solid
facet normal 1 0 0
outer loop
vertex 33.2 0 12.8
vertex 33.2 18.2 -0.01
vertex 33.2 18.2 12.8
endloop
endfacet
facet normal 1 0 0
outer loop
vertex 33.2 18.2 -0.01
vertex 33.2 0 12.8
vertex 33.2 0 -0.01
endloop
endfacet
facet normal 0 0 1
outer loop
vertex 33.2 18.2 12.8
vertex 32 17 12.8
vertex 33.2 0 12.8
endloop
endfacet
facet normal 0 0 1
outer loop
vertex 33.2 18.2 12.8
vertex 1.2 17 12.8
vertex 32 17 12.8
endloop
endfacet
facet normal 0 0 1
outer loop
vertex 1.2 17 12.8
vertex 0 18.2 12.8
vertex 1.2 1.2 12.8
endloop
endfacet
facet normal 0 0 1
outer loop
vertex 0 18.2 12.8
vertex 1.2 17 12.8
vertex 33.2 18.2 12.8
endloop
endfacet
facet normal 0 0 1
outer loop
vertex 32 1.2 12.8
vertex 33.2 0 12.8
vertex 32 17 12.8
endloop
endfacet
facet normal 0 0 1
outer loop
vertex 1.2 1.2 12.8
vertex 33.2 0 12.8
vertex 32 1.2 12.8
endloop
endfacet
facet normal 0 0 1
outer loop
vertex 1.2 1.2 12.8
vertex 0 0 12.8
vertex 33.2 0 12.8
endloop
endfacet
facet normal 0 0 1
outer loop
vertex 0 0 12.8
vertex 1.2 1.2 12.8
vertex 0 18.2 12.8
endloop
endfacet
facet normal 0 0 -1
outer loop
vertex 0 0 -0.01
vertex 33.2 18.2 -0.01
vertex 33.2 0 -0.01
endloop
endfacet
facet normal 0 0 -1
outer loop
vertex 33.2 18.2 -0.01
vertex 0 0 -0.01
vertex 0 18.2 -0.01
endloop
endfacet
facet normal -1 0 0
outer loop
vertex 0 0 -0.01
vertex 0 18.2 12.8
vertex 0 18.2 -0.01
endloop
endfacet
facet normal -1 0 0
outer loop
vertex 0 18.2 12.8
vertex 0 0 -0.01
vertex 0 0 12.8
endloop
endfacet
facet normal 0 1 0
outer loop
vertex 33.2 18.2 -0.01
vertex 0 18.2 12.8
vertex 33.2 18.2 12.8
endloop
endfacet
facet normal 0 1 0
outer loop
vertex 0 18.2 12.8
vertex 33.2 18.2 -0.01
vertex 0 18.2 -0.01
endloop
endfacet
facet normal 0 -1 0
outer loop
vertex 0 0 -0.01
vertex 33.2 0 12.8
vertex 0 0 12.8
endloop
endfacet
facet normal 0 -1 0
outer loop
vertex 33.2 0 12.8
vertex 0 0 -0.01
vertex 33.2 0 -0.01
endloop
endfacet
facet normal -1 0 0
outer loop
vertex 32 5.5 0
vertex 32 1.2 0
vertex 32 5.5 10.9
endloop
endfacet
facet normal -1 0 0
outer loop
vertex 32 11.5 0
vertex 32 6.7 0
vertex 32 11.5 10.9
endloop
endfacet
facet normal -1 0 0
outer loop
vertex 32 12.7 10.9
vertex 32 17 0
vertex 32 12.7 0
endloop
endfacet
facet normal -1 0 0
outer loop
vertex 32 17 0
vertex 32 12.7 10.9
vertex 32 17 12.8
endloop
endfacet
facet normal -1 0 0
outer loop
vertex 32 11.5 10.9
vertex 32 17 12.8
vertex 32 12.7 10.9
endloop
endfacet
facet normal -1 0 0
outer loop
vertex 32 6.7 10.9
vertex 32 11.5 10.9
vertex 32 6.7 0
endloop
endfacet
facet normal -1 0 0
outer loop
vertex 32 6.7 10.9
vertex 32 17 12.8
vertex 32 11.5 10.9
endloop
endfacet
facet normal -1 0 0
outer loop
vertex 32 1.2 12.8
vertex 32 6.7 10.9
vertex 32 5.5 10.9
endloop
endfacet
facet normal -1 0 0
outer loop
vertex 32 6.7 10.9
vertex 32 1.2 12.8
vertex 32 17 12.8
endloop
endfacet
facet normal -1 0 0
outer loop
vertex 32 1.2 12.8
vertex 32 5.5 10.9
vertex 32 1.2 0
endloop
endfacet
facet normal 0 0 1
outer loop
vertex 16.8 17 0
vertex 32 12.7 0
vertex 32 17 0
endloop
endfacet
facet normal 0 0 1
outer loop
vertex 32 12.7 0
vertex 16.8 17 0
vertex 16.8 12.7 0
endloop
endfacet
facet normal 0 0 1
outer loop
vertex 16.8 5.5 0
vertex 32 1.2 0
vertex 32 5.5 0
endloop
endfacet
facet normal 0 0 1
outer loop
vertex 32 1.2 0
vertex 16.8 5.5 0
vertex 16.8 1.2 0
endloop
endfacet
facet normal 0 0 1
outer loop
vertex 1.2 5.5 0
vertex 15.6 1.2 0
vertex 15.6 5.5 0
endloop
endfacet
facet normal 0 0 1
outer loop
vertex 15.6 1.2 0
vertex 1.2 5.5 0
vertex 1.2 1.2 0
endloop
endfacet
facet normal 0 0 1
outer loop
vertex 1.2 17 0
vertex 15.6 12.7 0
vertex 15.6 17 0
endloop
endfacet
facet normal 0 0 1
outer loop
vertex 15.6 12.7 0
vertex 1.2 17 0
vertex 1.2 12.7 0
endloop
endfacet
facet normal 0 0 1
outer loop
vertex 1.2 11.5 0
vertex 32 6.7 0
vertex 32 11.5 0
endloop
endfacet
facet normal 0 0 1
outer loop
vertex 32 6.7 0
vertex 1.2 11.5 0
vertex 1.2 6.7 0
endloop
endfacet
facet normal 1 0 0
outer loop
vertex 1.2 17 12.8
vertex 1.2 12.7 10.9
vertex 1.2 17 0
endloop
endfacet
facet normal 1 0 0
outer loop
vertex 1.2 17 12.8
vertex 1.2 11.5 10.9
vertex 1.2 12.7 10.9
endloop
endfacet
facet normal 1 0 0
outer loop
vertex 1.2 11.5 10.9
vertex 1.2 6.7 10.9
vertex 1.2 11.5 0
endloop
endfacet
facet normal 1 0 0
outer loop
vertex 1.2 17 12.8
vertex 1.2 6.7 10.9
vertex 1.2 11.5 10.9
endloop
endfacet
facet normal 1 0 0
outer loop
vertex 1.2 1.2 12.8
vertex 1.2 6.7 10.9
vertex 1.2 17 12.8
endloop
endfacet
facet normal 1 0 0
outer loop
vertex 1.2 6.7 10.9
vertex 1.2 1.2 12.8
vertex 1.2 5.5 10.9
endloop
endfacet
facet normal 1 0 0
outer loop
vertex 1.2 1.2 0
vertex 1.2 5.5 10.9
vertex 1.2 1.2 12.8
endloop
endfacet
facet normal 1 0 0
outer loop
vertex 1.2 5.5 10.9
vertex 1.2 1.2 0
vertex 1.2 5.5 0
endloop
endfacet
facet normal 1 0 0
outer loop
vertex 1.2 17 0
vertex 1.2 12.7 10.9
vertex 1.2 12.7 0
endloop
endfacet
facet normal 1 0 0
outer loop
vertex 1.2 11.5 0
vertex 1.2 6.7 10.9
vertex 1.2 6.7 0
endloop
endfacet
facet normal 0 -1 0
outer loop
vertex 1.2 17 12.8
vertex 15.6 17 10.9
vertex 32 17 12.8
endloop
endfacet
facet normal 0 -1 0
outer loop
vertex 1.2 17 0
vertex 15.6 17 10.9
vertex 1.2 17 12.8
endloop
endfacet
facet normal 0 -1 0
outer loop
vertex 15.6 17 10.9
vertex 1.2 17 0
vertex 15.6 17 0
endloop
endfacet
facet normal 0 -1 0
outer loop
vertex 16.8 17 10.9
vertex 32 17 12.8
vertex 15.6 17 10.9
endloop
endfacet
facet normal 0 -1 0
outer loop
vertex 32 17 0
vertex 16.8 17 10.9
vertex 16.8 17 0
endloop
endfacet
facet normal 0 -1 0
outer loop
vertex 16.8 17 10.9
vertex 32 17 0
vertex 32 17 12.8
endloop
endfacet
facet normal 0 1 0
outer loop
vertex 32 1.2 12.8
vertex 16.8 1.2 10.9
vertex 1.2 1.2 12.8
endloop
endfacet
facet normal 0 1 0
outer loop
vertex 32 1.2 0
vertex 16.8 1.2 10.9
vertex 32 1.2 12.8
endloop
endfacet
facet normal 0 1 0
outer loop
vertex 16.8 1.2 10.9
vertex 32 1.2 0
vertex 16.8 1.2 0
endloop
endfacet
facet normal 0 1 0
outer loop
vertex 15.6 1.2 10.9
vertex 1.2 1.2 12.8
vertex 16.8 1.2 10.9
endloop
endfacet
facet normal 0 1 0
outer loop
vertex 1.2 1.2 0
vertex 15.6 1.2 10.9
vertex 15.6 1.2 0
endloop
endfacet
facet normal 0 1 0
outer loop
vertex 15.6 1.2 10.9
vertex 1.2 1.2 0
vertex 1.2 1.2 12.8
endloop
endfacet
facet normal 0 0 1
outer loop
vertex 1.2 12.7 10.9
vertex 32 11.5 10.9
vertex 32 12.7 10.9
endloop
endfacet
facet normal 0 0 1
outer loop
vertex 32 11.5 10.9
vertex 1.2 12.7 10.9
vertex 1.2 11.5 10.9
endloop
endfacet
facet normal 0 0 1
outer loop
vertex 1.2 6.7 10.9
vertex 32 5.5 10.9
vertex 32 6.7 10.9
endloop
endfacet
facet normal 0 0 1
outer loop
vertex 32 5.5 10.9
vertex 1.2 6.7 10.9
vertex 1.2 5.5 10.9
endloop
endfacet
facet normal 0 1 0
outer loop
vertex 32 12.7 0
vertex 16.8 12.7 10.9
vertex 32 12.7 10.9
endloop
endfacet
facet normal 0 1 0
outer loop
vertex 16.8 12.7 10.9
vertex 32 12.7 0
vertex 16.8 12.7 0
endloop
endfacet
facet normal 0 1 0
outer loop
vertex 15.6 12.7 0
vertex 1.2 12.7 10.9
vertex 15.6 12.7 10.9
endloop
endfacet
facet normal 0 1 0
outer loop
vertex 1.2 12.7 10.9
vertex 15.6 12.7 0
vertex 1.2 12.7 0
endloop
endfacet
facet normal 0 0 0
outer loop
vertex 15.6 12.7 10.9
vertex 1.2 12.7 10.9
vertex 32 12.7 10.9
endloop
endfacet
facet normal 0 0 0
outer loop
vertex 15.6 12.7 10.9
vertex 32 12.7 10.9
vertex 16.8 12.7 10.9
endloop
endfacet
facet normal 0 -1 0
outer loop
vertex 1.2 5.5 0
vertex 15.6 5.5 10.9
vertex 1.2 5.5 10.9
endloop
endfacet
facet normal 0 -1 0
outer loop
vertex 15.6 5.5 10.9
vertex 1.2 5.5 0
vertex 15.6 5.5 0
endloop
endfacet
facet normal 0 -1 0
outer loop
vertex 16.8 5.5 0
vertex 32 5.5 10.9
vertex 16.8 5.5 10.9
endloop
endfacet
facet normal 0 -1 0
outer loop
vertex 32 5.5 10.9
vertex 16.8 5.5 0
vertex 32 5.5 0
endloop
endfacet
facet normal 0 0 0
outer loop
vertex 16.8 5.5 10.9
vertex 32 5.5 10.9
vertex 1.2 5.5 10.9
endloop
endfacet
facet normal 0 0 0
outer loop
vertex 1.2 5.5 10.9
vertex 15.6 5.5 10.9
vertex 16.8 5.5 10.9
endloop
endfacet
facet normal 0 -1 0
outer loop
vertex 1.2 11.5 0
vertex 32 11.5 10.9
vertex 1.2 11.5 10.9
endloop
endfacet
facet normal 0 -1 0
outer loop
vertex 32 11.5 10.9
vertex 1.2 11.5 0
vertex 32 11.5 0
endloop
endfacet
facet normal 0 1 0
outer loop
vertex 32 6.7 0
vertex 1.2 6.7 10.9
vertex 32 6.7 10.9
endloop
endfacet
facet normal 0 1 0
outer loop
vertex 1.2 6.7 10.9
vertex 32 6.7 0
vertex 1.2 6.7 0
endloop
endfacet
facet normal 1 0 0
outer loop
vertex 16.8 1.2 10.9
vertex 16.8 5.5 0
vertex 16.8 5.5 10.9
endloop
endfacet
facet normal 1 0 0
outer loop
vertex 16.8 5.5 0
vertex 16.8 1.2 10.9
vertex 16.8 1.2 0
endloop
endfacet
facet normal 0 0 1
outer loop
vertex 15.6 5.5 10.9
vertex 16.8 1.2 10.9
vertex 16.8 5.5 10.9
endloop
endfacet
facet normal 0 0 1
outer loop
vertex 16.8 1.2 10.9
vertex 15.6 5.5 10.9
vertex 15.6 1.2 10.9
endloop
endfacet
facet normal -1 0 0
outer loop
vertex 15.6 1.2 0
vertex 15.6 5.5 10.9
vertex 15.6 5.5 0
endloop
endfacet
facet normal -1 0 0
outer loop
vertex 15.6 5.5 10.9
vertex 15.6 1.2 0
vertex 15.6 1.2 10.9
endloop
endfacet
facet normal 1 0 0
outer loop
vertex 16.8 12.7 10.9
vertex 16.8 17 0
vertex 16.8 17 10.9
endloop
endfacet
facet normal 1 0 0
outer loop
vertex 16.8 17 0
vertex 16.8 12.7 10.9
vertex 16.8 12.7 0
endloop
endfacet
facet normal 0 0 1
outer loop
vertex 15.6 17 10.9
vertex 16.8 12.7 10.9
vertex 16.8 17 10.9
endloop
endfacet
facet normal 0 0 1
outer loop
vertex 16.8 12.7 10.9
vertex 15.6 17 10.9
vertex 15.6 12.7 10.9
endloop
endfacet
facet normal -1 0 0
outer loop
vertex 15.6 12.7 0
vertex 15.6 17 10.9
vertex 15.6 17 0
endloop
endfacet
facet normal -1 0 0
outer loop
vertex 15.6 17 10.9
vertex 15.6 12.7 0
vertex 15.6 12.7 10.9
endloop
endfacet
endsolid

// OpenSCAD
// file: ../Base/Boxes.scad
// Fischertechnik Box Foundation
// Pre-designed Boxes

use <Constants.scad>

include <PlacementOptions.scad>

box190Width = 190;
box190Depth = 130;
box130Width = 130;
box130Depth = 95;
boxUsageHeight = 33.9;
boxWallThickness = 2.4;
boxBaseThickness = 1.0;

// getBoxWallThickness()
// Gets the wall thickness of a Fischertechnik Box

function getBoxWallThickness() = boxWallThickness;

// Gets the usable height of a fischertechnik box
function getBoxUsageHeight() = boxUsageHeight;

// Gets the thickness of the Fischertechnik box base.
function getBoxBaseThickness() = boxBaseThickness;

// Gets the usable inner space of a Box 190 as an x/y-list
function getBox190Space() = [
    box190Width - 2*getBoxWallThickness(), 
    box190Depth - 2*getBoxWallThickness() ];

// Imports the Fischertechnik empty box 130x190 mm and places it at position 0,0
// 190x130 are the outer sizes, the inner space is slightly smaller. Use getBox190Space() to get the inner sizes.
// This module needs the STL file "Fischertechnik Box 130x190.stl" in the library path.
// The box is positioned that the usable inner space is at the 0,0,0 position. The

module Box190() {
    translate([-getBoxWallThickness(),-getBoxWallThickness(),-getBoxBaseThickness()])
        import("Fischertechnik Box 130x190.stl", convexity=3);
}

// Gets the usable inner space of a Box 130 as an x/y-list
function getBox130Space() = [
    box130Width - 2*getBoxWallThickness(), 
    box130Depth - 2*getBoxWallThickness() ];

// Imports the Fischertechnik empty box 95x130 mm and places it at position 0,0
// 190x130 are the outer sizes, the inner space is slightly smaller. Use getBox190Space() to get the inner sizes.
// This module needs the STL file "Fischertechnik Box 95x130.stl" in the library path.
// The box is positioned that the usable inner space is at the 0,0,0 position. The

module Box130() {
    translate([-getBoxWallThickness(),-getBoxWallThickness(),-getBoxBaseThickness()])
        import("Fischertechnik Box 95x130.stl", convexity=3);
}

// Creates a web at the specified box walls
// corner 0 = LowerLeft, 1 = UpperLeft, 2 = UpperRight, 3 = LowerRight
// side 0 = LeftOfCorner, 1 = RightOfCorner
// distance = Distance in mm from the corner
// box = inner width and depth of the box (default: Box 190)
// webWidth = length of the web (default is 3 mms)
// webThickness = thickness of the web (default is 1 mm)

module BoxWeb(corner, side, distance, box=getBox190Space(), webWidth=3, webThickness=1.0) {
    sink = getBoxWallThickness()/2;

    width = (corner % 2 == 0) ? 
            (side == LeftOfCorner ? webWidth : webThickness) :
            (side == LeftOfCorner ? webThickness : webWidth);

    depth = (corner % 2 == 0) ? 
            (side == RightOfCorner ? webWidth : webThickness) :
            (side == RightOfCorner ? webThickness : webWidth);
    
    xDiff = corner == LowerLeft ? 
                (side == LeftOfCorner ? -sink : distance) :
            (corner == UpperLeft ?                
                (side == LeftOfCorner ? distance : -sink) :
            (corner == UpperRight ?
                (side == LeftOfCorner ? box.x-webWidth+sink : box.x-distance-webThickness) :
                (side == LeftOfCorner ? box.x-distance-webThickness: box.x-webWidth+sink)));

    yDiff = corner == LowerLeft ? 
                (side == RightOfCorner ? -sink : distance) :
            (corner == UpperLeft ?
                (side == RightOfCorner ? box.y-distance : box.y-webWidth+sink) :
            (corner == UpperRight ?
                (side == RightOfCorner ? box.y-webWidth+sink : box.y-distance) :
                (side == RightOfCorner ? distance : -sink)));
    
    translate([xDiff, yDiff, -getExcess()])
        cube([width, depth, boxUsageHeight + 2*getExcess()]);
}
// file: ../Base/Rotation.scad
// Fischertechnik Box Foundation
// Geometry Helpers Rotation

include <PlacementOptions.scad>

// getRotatedSpace(space, rotation=NoRotation)
// Rotates the space dependent on the specified rotation

function getRotatedSpace(space, rotation=NoRotation) = [
    (rotation == Rotate90 || rotation == Rotate270) ? space.y : space.x,
    (rotation == Rotate90 || rotation == Rotate270) ? space.x : space.y
];

// Rotates the given space around the fixed left lower corner
// space = the space the children needs as width/depth list [width,depth]
// rotation = 0 Rotate0 degrees, 1 Rotate90 degrees, 2 Rotate180 degrees, 3 Rotate270 degrees (equivalent to -90)

module RotateFix(space, rotation=Rotate0) {
    dy = (rotation == Rotate0 || rotation == Rotate270) ? 0 :
        (rotation == Rotate90) ? space.x :
        space.y;
    dx = (rotation < Rotate180) ? 0 :
        (rotation == Rotate180) ? space.x :
        space.y;
    
    translate([dx, dy, 0])
        rotate([0, 0, rotations[rotation]])
            children();
}
// file: ../Base/Alignment.scad
// Fischertechnik Box Foundation
// Geometry Helpers Alignment

include <PlacementOptions.scad>

// getAlignedX(elementWidth, spaceWidth, align=AlignRight, offset=0)
// Gets the aligned X offset of an element with the given
// width in the given space.
// elementWidth = The width of the element to positon
// spaceWidth = The space where the element should be aligned
// align = 0 AlignLeft, 1 AlignCenter, 2 AlignRight
// offset = an optional offset from the aligned position. When
// aligned left or centered, then positive values are in X direction.
// When aligned right then positive values are in negative X direction.

function getAlignedX(elementWidth, spaceWidth, align=AlignRight, offset=0) =
    (align == AlignLeft) ?
        offset :
        ((align == AlignCenter) ?
        (spaceWidth - elementWidth)/2 + offset :
        spaceWidth - offset - elementWidth);

// getAlignedY(elementDepth, spaceDepth, align=AlignTop, offset=0)
// Gets the aligned Y offset of an element with the given
// depth in the given space.
// elementDepth = The depth of the element to positon
// spaceDepth = The space where the element should be aligned
// align = 0 AlignBottom, 1 AlignCenter, 2 AlignTop
// offset = an optional offset from the aligned position. When
// aligned bottom or centered, then positive values are in Y direction.
// When aligned top then positive values are in negative Y direction.

function getAlignedY(elementDepth, spaceDepth, align=AlignTop, offset=0) =
    (align == AlignBottom) ?
        offset :
        ((align == AlignCenter) ?
        (spaceDepth - elementDepth)/2 + offset :
        spaceDepth - offset - elementDepth);
// file: ../Base/PlacementOptions.scad
// Fischertechnik Box Foundation
// Placement Options

// Alignment
NoAlign = 0;
AlignLeft = 1;
AlignBottom = 2;
AlignCenter = 3;
AlignRight = 4;
AlignTop = 5;

// Element rotation degree steps
rotations = [0, -90, -180, -270];

// Rotation
NoRotation = 0;
Rotate0 = 0;
Rotate90 = 1;
Rotate180 = 2;
Rotate270 = 3;

// Docking (seen from above)
NoDock = -1;
DockLeft = 0;
DockTop = 1;
DockRight = 2;
DockCorner = 2;
DockBottom = 3;

// Web corners
LowerLeft = 0;
UpperLeft = 1;
UpperRight = 2;
LowerRight = 3;

// Web position relative to corner
LeftOfCorner = 0;
RightOfCorner = 1;
// file: ../Base/Placement.scad
// Fischertechnik Box Foundation
// Geometry Helpers Placement

use <Constants.scad>
use <Alignment.scad>
use <Rotation.scad>
use <Boxes.scad>

include <PlacementOptions.scad>

// Place(x=0, y=0, elementSpace=[0,0], alignX=AlignLeft, alignY=AlignBottom, rotation=Rotate0, boxSpace=getBox190Space())
// Places the child at the specified position
// y = Y-Position. This is a relative position when an X aligment is specified.
// x = X-Position. This is a relative position when an Y aligment is specified.
// elementSpace = space of the element to be placed [x,y]
// alignX = -1=NoAlign, 0 AlignLeft, 1 AlignCenter, 3 AlignRight (elementSpace and boxSpace required!)
// alignY = -1=NoAlign, 2 AlignBottom, 1 AlignCenter, 4 AlignTop (elementSpace and boxSpace required!)
// rotation = 0 Rotate0 0 degrees, 1 Rotate90 90 degrees, 
// 2 Rotate180 180 degrees, 3 Rotate270 270 degrees (equivalent to -90)
// boxSpace = Inner space of the box where the placement occurs [x,y] - default is Box 190x130 inner space

module Place(x=0, y=0, elementSpace=[0,0], 
  alignX=AlignLeft, alignY=AlignBottom, 
  rotation=NoRotation, boxSpace=getBox190Space()) {

    module Position(x, y, space, rotation=Rotate0) {
        translate([x, y, 0])
            RotateFix(space, rotation)
                children(0);
    }

    space = getRotatedSpace(elementSpace, rotation);
    alignedX = getAlignedX(space.x, boxSpace.x, alignX, x);
    alignedY = getAlignedY(space.y, boxSpace.y, alignY, y);
    Position(alignedX, alignedY, elementSpace, rotation)
        children(0);
}

// Center(space=getBox130Space(), elementSpace=[0,0])
// space = Space where the children is centered. For cylinder use centered=true and no elementSpace.
// elementSpace = space of the element to be centered [x,y]

module Center(space=getBox190Space(), elementSpace=[0,0]) {
    translate([(space.x - elementSpace.x) / 2, (space.y - elementSpace.y) / 2])
        children(0);
}

// CenterHorizontal(width=0, y=0, offset=0, space=getBox130Space())
// space = Space where the children is centered. For cylinder use centered=true and no elementSpace.
// elementSpace = space of the element to be centered [x,y]

module CenterHorizontal(width=0, y=0, offset=0, space=getBox190Space()) {
    translate([(space.x - width) / 2 + offset, y])
        children(0);
}

// CenterVertical(depth=0, x=0, offset=0, space=getBox130Space())
// space = Space where the children is centered. For cylinder use centered=true and no elementSpace.
// elementSpace = space of the element to be centered [x,y]

module CenterVerticalal(depth=0, x=0, offset=0, space=getBox190Space()) {
    translate([x, (space.y - depth) / 2 + offset])
        children(0);
}
// file: ../Base/Constants.scad
// Fischertechnik Box Foundation
// Constants

// Constant values necessary for multiple elements

// Base constants
dividerThickness = 1.2;
excess = 0.01;
fragments = 90;
tolerance = 0.8;

// Gets the thickness of a divider 
function getDividerThickness() = dividerThickness;

// Gets the excess that is used to merge walls into each other
function getExcess() = excess;

// Gets amount of fragments of a cylinder
function getFragments() = fragments;

// Gets the inner tolerance of a frame to each side
function getTolerance() = tolerance;


// Fischertechnik specific constants
axisDiameter = 4;
axisBottomDiameter = axisDiameter + 1;
standardEdgeDistance = 2.5;
standardWebDistance = 11.5;
standardCornerLength = 15;
tubeWallFactor = 1.6;

// Gets axis diameter
function getAxisDiameter() = axisDiameter;

// Gets axis bottom diameter for thicker part at the bottom
function getAxisBottomDiameter() = axisBottomDiameter;

// gets the standard distance to the wall of the box for dockable frames with webs
function getStandardEdgeDistance() = standardEdgeDistance;

// gets the standard distance of each web to the corner of the dockable frame
function getStandardWebDistance() = standardWebDistance;

// gets the standard length of the corner walls of a dockable frame
function getStandardCornerLength() = standardCornerLength;

// gets the wall thickness of a tube.
function getTubeWallThickness() = tubeWallFactor * getDividerThickness();
// main file
// Fischertechnik Box Library
// Frame for Rack 30
// 31054

use <../Base/Constants.scad>
use <../ModelBase/Complex.scad>

width = 30;
depth = 15;
height = 12.8;
factor = 1; // 30 mm

// getFrameRack30Space(count=1)
// Gets the space for a frame for count racks 30 in one row.

function getFrameRack30Space(count=1) = getFrameRackSpace(factor*count, 1);

// FrameRack(count)
// Frame for rack 30. The racks 30 are ordered in line.
// count = Count of racks in one row

module FrameRack30(count=1) {
    FrameRack(factor*count, 1);
}

// Test
color("lightgray")
FrameRack30();
